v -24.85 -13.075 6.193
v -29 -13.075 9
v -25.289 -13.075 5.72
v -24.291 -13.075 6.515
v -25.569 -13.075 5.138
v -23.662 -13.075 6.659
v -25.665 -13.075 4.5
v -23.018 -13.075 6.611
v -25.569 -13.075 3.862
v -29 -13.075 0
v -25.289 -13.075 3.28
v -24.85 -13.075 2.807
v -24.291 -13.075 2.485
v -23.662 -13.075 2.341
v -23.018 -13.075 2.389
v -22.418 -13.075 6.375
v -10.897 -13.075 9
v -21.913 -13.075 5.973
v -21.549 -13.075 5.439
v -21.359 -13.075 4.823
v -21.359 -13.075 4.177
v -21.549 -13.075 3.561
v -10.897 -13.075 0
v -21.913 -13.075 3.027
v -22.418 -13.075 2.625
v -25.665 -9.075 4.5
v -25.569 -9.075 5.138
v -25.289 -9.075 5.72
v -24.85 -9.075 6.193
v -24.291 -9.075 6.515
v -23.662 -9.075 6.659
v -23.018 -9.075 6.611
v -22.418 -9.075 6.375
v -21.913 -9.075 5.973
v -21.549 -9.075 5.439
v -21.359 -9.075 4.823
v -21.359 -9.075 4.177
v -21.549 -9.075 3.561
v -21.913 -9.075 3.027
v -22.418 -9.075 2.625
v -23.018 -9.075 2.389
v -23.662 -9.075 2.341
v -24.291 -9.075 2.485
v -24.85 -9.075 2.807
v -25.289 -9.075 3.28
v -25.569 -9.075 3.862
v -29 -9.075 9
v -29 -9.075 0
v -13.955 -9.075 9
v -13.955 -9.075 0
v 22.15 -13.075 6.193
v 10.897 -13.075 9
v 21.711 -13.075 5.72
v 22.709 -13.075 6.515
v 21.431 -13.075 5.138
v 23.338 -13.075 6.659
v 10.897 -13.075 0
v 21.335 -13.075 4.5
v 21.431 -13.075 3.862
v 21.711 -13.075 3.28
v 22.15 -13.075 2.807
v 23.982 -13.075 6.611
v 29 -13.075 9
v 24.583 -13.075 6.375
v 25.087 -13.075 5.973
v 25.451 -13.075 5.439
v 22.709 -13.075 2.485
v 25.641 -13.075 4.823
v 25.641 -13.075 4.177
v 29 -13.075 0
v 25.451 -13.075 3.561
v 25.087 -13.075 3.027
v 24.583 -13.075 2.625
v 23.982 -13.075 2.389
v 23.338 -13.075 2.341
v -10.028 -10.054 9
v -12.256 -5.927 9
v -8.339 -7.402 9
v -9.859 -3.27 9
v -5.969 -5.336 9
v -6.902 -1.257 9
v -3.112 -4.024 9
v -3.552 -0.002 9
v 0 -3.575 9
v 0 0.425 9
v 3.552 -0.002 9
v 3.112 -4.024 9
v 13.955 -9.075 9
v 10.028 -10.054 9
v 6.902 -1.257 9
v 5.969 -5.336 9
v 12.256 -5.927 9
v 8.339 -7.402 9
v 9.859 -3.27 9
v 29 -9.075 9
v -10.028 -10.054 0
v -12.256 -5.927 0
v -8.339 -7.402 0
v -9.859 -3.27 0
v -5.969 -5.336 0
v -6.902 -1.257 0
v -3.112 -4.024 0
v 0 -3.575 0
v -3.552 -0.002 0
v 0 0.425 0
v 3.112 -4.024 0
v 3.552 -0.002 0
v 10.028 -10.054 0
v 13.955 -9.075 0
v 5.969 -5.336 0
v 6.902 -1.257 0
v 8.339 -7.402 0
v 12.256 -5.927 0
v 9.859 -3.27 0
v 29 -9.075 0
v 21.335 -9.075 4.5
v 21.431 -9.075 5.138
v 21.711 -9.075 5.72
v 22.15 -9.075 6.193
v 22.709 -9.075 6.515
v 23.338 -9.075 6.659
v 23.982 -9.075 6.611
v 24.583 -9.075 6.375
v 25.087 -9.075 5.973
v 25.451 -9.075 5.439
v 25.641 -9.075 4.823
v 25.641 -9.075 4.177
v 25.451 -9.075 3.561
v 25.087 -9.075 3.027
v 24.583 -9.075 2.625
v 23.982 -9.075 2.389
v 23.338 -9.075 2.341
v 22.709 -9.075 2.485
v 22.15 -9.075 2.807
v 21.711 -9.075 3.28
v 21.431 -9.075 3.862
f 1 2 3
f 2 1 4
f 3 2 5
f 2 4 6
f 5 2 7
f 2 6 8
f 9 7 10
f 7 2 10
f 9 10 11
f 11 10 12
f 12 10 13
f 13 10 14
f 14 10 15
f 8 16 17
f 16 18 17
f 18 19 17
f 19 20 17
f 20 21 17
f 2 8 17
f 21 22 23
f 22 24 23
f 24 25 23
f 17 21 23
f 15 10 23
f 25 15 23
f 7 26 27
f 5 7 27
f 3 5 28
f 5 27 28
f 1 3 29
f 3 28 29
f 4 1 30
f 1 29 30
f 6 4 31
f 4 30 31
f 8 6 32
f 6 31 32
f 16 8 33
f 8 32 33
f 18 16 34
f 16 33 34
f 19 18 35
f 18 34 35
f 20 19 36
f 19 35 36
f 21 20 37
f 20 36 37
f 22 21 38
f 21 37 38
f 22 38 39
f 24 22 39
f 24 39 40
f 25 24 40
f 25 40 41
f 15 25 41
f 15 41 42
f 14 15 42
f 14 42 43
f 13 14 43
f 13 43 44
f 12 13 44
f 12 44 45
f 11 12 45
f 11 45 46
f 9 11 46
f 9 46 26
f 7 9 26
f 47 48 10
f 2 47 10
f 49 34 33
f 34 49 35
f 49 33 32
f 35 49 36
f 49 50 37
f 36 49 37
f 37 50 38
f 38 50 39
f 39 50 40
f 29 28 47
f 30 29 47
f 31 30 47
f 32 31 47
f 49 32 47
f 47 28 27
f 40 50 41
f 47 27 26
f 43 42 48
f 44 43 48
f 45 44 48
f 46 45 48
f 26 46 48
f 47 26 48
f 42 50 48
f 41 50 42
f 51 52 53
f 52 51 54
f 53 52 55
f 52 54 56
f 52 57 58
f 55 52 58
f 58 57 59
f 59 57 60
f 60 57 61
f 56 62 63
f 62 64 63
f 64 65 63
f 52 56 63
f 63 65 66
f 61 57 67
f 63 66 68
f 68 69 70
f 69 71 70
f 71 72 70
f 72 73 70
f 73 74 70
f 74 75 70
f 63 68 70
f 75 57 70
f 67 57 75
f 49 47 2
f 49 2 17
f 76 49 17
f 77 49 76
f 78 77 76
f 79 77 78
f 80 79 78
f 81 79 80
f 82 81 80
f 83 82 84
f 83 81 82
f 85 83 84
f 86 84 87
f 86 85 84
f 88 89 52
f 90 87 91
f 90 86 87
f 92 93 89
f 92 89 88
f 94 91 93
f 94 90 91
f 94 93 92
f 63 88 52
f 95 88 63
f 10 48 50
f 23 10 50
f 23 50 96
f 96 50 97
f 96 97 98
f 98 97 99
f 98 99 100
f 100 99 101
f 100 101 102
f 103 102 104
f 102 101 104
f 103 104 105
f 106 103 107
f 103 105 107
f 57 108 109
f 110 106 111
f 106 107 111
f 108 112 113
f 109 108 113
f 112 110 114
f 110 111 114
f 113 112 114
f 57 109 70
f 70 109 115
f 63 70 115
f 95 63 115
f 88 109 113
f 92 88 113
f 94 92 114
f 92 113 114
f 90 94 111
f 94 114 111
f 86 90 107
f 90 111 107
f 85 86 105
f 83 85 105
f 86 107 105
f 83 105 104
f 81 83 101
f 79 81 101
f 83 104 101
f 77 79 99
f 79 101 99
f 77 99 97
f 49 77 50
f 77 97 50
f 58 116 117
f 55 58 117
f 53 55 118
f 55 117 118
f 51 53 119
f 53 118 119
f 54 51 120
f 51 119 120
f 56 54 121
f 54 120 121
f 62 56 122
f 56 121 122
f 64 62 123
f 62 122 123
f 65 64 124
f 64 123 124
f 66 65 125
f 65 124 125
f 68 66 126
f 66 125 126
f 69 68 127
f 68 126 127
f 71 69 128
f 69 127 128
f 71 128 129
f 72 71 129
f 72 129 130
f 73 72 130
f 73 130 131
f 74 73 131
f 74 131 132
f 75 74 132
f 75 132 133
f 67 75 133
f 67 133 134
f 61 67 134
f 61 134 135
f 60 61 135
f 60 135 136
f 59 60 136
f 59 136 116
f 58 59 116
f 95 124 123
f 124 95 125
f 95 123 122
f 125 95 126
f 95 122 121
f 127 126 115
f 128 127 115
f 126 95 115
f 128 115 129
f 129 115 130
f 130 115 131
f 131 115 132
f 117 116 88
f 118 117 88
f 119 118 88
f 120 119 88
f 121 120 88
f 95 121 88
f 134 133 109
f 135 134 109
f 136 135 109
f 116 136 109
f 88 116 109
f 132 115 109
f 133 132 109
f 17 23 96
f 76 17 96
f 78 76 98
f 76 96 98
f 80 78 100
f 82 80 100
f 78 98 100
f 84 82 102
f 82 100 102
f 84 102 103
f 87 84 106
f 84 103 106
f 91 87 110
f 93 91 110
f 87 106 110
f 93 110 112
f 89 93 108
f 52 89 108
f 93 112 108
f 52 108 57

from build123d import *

# Parameters (mm, degrees)
BOSS_EXTRUDE1_DEPTH = 9
SKETCH2_R           = 2.165
CUT_EXTRUDE1_DEPTH  = 32.81587654


with BuildPart() as part:
    # Sketch1 → Boss-Extrude1 (new body)
    with BuildSketch(Plane.XY):
        with BuildLine():
            Line((29, -13.075), (29, -9.075))
            Line((29, -9.075), (13.955285737, -9.075))
            ThreePointArc((13.955285737, -9.075), (0, 0.425), (-13.955285737, -9.075))
            Line((-13.955285737, -9.075), (-29, -9.075))
            Line((-29, -9.075), (-29, -13.075))
            Line((-29, -13.075), (-10.897247359, -13.075))
            ThreePointArc((-10.897247359, -13.075), (0, -3.575), (10.897247359, -13.075))
            Line((10.897247359, -13.075), (29, -13.075))
        make_face()
    extrude(amount=BOSS_EXTRUDE1_DEPTH)

    # Sketch2 → Cut-Extrude1 (cut, through all)
    with BuildSketch(Plane(origin=(0, -9.075, 0), x_dir=(1, 0, 0), z_dir=(0, 1, 0))):
        with Locations(Location((-23.50000005, -4.5, 0), (0, 0, 180))):
            Circle(SKETCH2_R)
        with Locations(Location((23.50000005, -4.5, 0), (0, 0, 180))):
            Circle(SKETCH2_R)
    extrude(amount=-CUT_EXTRUDE1_DEPTH, mode=Mode.SUBTRACT)


solid = part.part
